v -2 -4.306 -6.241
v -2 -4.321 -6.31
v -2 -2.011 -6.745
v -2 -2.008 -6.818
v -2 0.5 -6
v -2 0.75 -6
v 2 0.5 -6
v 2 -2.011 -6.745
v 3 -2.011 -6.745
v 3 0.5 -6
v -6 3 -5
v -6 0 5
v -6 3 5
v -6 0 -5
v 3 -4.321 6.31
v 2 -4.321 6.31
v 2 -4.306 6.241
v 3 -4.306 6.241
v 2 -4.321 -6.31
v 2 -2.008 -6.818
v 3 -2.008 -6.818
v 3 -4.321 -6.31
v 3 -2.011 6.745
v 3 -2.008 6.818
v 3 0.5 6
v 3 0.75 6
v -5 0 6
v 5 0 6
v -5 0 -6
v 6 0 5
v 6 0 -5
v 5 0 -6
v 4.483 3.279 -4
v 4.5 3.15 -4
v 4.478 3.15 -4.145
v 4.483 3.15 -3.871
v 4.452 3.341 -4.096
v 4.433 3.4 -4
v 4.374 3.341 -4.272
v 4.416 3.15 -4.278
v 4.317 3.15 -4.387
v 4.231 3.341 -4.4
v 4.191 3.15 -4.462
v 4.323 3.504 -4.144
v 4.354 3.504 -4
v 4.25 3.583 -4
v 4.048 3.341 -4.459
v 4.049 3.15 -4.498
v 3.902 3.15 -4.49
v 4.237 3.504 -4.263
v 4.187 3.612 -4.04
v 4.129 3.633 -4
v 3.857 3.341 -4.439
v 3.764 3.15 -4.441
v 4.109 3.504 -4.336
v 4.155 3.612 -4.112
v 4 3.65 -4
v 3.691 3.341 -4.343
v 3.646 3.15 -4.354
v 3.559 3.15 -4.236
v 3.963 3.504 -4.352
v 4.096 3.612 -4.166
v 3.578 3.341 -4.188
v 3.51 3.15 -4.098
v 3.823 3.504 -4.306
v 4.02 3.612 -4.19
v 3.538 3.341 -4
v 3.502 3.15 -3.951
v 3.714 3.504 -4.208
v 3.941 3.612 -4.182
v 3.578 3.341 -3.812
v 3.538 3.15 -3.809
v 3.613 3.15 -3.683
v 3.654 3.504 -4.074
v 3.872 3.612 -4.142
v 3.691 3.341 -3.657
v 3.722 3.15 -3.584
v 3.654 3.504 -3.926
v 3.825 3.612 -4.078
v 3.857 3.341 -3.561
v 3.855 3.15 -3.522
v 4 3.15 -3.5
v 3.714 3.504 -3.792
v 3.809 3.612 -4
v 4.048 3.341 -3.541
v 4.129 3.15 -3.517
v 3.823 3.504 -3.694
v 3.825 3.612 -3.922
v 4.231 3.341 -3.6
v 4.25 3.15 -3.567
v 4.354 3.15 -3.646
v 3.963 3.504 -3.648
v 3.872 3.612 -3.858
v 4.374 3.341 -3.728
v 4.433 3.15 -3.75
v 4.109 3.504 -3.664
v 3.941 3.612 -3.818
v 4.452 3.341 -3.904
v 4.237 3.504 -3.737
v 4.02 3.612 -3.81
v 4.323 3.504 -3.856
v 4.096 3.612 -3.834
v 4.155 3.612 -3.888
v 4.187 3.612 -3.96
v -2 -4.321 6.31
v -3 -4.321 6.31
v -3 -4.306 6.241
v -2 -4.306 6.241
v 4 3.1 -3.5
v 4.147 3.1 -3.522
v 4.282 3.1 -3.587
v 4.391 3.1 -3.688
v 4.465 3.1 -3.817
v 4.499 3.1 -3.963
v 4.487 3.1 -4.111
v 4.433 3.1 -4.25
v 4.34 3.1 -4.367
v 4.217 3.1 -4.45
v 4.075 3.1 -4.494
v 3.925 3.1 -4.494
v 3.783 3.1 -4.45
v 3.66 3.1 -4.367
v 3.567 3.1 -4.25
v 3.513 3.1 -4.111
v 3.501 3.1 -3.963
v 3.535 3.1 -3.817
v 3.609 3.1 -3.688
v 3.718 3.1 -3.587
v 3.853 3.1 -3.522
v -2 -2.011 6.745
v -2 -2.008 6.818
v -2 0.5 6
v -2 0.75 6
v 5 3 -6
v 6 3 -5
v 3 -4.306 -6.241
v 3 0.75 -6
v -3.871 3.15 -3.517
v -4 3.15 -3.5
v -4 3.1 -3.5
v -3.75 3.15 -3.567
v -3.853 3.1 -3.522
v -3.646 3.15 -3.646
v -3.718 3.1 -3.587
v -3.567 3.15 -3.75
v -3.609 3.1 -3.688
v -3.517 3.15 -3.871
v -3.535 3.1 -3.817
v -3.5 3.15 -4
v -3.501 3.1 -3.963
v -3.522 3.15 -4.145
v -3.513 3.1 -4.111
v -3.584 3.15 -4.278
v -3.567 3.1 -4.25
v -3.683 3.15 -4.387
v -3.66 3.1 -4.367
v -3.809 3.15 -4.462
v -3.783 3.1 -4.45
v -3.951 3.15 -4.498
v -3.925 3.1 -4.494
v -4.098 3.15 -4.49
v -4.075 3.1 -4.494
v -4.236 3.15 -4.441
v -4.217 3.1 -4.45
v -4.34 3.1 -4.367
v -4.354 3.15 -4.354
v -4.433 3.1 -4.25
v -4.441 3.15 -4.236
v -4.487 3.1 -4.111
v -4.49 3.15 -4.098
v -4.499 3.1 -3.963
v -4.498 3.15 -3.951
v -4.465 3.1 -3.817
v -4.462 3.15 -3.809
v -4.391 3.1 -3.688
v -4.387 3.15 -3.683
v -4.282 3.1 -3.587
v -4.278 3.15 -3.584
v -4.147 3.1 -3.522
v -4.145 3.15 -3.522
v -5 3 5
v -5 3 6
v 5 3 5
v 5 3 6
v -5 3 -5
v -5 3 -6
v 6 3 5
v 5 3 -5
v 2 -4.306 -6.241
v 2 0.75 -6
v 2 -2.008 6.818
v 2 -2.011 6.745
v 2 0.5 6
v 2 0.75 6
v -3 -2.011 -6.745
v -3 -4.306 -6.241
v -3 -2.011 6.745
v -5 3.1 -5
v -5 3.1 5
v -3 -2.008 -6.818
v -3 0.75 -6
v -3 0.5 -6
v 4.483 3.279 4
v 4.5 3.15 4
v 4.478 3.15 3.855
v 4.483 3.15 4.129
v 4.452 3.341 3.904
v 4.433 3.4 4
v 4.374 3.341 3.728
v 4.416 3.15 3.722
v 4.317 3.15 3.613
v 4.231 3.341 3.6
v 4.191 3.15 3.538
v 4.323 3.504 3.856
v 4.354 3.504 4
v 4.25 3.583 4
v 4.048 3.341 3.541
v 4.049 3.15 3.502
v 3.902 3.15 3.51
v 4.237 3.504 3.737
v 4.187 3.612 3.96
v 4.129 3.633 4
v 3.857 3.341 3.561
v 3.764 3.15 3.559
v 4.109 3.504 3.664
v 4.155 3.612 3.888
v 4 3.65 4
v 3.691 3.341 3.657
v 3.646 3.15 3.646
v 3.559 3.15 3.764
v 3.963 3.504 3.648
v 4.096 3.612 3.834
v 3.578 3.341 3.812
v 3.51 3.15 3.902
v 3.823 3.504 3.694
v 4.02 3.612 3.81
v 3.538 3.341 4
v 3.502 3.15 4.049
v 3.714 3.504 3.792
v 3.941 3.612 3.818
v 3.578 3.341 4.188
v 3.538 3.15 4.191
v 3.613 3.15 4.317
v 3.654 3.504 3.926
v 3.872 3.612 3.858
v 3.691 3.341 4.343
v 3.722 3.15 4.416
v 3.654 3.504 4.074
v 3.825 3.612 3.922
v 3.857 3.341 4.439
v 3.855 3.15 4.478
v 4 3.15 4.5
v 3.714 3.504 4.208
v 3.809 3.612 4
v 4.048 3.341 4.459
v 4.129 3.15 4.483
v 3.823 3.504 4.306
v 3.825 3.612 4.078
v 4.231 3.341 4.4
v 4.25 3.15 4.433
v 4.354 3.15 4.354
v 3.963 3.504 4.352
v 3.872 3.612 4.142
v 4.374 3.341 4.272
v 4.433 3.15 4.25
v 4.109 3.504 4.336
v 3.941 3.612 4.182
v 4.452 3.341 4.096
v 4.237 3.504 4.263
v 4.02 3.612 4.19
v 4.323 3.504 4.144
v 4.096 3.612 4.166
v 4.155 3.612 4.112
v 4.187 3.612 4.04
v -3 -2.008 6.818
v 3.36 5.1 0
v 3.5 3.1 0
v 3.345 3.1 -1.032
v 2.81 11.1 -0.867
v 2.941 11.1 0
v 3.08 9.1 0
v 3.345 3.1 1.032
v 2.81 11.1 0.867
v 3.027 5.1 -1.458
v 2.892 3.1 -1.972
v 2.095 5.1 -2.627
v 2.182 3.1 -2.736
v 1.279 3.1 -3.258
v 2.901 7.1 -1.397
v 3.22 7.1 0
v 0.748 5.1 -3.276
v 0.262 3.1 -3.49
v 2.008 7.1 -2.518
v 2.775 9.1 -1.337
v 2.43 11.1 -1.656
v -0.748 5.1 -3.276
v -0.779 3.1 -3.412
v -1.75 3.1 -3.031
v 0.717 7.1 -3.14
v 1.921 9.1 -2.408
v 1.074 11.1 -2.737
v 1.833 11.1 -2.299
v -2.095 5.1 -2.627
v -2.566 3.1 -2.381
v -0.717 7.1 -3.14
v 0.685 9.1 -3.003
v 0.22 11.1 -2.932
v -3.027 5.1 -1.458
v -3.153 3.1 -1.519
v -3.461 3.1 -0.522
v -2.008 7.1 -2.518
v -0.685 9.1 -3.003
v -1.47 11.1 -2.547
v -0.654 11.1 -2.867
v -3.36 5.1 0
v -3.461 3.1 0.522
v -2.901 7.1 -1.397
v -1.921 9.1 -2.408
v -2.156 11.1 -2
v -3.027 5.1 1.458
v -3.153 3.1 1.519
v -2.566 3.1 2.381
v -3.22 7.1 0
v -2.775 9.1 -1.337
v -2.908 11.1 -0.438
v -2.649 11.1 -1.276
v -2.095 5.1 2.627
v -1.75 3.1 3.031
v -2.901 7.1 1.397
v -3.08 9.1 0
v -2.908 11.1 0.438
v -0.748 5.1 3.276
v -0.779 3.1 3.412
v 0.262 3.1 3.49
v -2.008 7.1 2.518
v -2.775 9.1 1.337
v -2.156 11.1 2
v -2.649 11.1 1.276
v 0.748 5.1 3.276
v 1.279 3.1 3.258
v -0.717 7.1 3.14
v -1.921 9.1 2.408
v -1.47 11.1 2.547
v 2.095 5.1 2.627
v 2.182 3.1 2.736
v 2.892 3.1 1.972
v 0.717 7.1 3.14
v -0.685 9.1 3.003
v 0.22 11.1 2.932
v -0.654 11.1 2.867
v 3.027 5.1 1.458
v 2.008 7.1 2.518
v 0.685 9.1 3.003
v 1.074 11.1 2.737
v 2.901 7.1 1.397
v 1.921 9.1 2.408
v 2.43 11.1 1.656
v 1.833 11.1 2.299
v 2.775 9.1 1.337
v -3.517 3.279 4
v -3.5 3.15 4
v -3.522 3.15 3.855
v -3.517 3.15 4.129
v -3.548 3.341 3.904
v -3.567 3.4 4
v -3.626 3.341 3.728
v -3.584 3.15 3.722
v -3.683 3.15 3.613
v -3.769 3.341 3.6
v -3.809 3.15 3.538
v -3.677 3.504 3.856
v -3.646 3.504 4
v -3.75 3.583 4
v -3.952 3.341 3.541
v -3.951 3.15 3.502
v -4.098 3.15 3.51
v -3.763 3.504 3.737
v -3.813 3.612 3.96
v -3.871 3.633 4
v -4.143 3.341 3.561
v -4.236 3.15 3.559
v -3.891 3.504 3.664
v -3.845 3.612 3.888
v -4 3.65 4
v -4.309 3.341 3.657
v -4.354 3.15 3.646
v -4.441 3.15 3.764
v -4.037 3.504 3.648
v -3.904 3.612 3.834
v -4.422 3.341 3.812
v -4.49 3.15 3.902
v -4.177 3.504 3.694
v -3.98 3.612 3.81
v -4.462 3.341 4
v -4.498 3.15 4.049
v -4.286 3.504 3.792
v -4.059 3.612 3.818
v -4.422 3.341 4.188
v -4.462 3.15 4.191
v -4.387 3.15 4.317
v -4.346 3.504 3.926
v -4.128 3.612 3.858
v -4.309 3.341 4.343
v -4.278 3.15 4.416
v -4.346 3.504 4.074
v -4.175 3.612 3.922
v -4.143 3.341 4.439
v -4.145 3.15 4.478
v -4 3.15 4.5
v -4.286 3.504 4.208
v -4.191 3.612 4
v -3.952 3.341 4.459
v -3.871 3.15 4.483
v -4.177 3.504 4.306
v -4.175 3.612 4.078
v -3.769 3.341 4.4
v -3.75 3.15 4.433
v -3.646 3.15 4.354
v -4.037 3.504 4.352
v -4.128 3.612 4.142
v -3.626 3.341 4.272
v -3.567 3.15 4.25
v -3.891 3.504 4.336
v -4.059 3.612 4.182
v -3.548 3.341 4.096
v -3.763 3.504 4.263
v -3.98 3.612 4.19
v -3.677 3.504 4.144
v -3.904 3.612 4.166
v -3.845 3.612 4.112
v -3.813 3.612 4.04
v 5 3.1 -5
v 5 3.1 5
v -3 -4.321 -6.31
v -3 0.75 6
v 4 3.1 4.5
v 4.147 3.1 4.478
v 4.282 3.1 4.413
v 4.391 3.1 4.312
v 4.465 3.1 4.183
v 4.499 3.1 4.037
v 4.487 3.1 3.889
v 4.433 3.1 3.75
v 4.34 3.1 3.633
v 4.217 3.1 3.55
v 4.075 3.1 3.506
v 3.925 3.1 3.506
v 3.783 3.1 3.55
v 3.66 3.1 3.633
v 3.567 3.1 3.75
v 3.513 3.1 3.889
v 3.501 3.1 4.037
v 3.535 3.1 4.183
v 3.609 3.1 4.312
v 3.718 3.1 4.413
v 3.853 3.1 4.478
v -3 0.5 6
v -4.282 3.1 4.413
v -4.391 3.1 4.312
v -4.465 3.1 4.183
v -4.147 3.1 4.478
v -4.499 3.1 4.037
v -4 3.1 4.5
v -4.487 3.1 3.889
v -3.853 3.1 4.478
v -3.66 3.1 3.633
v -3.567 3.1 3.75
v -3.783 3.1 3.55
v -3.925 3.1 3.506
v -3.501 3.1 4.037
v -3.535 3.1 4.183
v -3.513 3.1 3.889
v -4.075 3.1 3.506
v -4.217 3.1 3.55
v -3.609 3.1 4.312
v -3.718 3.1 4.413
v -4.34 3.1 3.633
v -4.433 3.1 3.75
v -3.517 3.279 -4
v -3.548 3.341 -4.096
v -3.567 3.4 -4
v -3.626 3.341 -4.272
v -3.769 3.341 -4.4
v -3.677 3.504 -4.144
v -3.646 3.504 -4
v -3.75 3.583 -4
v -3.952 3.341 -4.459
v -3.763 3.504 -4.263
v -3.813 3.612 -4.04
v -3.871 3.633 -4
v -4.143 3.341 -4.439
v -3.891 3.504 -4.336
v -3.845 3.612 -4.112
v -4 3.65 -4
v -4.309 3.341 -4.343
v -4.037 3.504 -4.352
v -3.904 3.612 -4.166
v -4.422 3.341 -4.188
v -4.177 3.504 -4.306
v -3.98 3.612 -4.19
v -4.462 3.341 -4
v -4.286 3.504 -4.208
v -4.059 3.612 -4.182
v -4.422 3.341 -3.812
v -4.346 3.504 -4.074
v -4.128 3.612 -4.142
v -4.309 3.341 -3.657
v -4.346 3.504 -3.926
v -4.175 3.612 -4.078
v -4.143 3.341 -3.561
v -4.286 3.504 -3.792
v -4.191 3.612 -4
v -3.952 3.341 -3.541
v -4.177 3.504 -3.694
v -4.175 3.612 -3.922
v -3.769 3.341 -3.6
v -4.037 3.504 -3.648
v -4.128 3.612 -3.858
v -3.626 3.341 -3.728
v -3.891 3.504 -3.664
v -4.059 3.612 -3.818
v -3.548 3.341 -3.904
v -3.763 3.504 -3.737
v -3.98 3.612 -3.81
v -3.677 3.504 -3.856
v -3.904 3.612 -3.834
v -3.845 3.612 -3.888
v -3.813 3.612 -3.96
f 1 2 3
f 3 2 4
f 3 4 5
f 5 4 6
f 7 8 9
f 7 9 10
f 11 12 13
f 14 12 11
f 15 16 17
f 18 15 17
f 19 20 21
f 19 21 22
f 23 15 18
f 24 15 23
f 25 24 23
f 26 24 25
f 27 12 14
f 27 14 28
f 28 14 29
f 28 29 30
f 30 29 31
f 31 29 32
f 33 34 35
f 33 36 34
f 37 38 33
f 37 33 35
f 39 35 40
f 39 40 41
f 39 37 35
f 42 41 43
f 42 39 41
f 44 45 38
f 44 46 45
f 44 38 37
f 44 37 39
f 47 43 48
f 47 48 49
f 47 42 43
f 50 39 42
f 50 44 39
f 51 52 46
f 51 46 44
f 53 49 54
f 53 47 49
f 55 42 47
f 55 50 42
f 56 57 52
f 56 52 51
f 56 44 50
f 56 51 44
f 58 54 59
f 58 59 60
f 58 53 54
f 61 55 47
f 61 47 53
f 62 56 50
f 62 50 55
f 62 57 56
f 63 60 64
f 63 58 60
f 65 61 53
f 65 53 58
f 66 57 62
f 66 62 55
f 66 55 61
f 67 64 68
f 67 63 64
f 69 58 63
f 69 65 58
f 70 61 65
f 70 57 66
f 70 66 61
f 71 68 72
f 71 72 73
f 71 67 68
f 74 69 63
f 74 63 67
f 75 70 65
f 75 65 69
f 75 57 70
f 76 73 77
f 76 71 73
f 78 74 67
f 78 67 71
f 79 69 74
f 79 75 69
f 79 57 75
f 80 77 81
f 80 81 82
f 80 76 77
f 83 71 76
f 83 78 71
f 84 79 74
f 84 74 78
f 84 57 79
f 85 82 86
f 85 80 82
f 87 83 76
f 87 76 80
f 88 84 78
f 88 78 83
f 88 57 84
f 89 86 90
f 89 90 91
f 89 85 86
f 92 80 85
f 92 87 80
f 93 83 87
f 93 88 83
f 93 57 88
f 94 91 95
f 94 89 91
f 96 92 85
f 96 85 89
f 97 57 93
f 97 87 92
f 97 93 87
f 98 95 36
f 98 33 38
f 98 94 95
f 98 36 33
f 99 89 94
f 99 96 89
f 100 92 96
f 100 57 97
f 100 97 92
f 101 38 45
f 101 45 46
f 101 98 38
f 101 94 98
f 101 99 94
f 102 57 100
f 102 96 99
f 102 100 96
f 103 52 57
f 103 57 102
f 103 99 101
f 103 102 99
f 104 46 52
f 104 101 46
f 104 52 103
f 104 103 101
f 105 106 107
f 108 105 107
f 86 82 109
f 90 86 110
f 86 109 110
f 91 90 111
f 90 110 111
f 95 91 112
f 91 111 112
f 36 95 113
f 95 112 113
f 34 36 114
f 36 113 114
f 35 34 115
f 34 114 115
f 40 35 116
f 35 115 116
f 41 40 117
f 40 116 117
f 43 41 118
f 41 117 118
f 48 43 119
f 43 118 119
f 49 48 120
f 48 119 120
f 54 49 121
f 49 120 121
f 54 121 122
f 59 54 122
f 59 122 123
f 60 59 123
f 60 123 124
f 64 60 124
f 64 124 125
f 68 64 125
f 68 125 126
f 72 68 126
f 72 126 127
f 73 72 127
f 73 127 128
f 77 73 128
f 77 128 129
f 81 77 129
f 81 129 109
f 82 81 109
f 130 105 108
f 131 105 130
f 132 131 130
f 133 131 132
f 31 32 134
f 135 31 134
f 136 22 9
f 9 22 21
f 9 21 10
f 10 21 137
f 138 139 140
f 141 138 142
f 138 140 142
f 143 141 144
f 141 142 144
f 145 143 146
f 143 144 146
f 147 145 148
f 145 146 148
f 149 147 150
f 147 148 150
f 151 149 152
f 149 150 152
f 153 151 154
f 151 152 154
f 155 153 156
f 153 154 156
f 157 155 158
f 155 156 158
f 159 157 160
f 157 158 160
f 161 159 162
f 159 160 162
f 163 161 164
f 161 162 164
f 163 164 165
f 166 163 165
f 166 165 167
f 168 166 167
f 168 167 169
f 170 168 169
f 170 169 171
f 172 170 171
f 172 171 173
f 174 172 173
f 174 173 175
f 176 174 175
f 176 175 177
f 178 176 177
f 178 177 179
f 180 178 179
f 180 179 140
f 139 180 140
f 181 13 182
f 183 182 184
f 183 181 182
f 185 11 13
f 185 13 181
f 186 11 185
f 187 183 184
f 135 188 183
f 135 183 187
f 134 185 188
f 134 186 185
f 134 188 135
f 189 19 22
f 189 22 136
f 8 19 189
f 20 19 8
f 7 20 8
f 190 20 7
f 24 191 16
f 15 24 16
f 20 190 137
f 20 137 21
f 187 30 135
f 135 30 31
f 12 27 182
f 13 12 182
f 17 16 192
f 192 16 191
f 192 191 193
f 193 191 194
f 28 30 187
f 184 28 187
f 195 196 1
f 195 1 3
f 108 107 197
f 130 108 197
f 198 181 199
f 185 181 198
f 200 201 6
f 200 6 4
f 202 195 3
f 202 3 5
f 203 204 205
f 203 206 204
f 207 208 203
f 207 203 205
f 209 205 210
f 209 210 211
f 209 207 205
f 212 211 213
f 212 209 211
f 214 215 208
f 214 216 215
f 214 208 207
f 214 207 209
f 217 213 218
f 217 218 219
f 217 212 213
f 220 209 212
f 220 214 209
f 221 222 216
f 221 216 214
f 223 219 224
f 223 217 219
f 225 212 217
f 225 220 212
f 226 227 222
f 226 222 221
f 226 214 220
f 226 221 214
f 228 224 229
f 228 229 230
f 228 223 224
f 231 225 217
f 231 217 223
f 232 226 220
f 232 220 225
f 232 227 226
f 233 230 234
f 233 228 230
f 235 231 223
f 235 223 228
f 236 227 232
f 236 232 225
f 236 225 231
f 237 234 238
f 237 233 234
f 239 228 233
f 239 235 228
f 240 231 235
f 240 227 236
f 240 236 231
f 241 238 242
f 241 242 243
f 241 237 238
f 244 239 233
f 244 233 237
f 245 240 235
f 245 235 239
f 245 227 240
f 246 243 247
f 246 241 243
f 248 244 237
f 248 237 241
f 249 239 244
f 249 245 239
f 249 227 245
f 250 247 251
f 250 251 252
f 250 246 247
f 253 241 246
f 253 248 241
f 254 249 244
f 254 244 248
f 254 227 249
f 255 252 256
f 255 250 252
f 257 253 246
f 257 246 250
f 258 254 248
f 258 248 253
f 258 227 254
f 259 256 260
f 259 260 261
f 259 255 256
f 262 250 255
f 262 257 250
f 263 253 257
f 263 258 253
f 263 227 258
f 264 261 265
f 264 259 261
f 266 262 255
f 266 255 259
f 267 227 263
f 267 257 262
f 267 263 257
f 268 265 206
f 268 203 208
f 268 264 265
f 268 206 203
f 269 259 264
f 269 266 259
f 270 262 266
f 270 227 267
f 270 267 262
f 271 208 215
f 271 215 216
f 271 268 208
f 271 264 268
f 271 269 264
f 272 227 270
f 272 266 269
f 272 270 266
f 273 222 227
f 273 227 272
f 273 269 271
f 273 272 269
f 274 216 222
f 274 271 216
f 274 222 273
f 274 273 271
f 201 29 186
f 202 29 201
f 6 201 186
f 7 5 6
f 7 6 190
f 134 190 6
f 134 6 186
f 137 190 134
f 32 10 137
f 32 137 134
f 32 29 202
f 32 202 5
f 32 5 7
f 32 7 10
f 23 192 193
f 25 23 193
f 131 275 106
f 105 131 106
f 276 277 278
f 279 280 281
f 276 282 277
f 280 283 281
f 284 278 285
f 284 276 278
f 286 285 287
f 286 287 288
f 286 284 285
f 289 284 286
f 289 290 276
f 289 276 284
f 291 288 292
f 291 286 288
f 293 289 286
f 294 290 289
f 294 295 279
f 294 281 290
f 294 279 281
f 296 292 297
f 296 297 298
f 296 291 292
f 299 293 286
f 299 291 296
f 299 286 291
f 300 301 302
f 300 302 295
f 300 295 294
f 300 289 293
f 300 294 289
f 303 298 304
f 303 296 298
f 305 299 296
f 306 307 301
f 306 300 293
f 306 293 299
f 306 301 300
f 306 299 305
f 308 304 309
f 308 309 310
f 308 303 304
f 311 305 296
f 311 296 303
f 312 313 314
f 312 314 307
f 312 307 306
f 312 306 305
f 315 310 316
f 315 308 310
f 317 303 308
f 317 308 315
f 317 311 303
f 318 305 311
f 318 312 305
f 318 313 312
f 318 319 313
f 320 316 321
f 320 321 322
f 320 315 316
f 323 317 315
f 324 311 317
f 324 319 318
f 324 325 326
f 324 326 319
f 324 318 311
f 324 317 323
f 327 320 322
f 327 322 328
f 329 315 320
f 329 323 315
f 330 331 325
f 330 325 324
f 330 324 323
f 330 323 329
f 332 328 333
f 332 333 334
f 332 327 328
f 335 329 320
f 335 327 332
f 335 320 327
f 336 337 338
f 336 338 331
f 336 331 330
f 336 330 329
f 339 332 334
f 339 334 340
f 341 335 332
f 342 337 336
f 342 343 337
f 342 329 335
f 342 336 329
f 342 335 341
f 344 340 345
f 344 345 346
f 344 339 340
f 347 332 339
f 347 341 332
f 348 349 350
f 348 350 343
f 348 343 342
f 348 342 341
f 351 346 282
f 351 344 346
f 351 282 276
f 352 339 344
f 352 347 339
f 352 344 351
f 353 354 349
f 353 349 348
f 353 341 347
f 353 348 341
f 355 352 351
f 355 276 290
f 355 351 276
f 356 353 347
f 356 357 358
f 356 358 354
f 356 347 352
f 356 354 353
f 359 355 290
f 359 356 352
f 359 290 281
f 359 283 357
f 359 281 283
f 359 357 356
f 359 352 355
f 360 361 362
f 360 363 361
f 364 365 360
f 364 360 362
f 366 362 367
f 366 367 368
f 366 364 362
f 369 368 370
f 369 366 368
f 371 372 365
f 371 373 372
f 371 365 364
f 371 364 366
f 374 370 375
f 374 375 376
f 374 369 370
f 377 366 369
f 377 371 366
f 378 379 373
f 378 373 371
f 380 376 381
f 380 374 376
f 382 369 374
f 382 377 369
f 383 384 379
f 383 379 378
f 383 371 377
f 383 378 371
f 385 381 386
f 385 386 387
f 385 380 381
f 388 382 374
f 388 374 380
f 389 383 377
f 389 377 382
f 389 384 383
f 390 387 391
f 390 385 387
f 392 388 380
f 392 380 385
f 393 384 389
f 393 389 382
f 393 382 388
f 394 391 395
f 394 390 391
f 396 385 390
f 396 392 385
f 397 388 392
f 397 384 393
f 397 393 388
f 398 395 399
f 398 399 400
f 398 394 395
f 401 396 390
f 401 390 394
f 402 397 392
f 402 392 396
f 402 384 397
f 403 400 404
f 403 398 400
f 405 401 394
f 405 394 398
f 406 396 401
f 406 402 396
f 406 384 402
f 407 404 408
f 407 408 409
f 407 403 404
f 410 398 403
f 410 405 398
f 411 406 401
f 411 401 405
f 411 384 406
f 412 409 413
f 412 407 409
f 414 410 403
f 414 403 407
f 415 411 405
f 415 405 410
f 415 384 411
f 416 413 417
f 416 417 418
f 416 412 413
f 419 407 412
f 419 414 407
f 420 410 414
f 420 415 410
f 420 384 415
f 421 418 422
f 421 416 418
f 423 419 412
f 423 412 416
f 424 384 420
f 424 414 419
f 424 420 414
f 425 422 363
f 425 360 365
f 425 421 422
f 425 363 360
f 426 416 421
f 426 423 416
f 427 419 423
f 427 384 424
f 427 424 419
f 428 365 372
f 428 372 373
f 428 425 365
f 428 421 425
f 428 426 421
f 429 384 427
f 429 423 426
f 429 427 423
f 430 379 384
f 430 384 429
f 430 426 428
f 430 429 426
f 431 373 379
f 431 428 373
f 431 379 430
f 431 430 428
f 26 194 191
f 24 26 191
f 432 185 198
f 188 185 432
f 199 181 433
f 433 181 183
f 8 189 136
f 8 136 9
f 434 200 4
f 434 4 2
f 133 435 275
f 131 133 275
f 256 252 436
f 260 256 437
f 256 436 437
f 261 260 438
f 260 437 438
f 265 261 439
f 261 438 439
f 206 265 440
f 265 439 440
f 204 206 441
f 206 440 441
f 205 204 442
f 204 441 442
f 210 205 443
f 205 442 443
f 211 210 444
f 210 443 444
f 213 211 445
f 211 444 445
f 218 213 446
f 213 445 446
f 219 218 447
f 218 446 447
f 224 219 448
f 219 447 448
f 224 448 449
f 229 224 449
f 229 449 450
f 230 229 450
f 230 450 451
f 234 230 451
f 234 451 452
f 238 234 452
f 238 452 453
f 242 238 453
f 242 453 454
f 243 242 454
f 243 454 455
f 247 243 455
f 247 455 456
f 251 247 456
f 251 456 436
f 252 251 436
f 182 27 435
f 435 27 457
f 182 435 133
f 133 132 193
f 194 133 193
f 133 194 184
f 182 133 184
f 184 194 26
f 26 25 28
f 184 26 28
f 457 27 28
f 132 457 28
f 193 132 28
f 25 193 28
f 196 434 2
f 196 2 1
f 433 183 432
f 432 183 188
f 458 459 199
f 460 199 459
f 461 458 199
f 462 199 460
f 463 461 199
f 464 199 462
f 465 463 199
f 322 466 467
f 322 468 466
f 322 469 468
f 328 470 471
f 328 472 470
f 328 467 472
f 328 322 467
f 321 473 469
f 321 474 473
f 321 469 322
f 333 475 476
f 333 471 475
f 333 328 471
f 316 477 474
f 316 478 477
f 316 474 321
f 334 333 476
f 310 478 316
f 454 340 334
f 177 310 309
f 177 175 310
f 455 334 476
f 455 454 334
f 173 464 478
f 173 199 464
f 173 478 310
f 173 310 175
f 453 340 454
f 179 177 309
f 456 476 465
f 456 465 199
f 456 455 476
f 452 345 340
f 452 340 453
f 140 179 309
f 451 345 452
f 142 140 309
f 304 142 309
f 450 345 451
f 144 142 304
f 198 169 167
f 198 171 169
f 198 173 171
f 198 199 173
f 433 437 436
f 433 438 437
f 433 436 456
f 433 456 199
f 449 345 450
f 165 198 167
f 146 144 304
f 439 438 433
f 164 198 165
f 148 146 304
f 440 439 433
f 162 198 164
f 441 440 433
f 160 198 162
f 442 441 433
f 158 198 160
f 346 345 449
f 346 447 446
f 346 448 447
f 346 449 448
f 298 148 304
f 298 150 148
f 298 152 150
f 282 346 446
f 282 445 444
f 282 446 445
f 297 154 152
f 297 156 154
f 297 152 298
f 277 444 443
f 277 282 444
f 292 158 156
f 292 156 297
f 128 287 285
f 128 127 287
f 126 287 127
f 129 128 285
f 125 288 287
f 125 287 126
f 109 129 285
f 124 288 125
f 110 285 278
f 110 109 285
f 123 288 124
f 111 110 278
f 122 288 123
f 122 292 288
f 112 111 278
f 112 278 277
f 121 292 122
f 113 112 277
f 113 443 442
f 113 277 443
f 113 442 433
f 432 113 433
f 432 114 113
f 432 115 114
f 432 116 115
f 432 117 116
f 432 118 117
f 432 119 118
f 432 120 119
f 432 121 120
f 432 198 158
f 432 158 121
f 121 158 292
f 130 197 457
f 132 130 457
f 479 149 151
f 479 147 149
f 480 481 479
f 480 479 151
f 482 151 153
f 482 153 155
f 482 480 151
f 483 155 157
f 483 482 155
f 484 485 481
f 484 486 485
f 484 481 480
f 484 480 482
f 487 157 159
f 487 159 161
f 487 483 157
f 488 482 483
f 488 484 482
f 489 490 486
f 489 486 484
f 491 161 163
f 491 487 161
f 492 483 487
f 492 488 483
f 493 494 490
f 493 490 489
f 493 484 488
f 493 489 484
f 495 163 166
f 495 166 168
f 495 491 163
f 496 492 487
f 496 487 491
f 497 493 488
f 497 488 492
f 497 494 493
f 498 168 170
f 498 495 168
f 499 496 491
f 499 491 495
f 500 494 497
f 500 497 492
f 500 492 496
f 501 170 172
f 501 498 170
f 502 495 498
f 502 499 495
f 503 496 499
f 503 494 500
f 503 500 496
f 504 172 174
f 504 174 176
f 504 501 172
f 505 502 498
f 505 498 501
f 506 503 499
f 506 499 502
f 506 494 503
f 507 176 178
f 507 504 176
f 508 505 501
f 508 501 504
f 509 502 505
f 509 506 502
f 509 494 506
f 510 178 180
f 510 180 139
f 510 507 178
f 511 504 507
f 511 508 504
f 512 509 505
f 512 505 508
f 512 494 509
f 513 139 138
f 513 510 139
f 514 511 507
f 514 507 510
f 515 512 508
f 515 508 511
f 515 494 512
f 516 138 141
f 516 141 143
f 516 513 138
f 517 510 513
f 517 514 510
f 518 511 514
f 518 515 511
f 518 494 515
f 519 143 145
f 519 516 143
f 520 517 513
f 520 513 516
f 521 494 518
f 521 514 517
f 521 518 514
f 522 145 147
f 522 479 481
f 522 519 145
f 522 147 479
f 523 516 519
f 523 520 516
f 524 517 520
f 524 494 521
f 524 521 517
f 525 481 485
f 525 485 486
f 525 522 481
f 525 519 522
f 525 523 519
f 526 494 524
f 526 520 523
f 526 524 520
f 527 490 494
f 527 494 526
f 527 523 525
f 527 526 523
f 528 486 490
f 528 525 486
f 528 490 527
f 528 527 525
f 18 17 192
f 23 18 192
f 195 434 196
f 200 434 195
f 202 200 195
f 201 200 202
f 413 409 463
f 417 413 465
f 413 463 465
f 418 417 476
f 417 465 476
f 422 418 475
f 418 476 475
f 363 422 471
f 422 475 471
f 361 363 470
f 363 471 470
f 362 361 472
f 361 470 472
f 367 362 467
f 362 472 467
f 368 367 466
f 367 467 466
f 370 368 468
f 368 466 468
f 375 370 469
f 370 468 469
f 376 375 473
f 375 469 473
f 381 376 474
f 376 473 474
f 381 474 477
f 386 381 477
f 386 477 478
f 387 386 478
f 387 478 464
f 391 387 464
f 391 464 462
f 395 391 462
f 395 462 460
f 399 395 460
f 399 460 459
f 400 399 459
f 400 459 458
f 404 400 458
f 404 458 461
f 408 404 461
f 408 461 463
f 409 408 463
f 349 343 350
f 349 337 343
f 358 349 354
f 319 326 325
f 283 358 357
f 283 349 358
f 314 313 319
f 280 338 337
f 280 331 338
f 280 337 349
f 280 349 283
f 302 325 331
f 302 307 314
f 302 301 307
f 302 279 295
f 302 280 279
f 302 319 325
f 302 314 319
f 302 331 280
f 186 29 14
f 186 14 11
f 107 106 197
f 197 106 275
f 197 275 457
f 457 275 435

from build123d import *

# Parameters (mm, degrees)
SKETCH1_W            = 12
SKETCH1_H            = 12
BOSS_EXTRUDE1_DEPTH  = 3
CHAMFER1_SIZE        = 1
SKETCH2_W            = 10
SKETCH2_H            = 10
BOSS_EXTRUDE2_DEPTH  = 0.1
SKETCH3_R            = 0.5
BOSS_EXTRUDE3_DEPTH  = 0.05
LPATTERN1_COUNT      = 2
LPATTERN1_PITCH      = 8
LPATTERN1_COUNT_DIR2 = 2
LPATTERN1_PITCH_DIR2 = 8
SKETCH4_R            = 3.5
BOSS_EXTRUDE4_DEPTH  = 8
BOSS_EXTRUDE4_TAPER  = 4
SWEEP1_START         = -3
SWEEP1_DEPTH         = 1
SWEEP1_START_2       = 2
SWEEP1_2_DEPTH       = 1


# Read off the part's stored shape, not the designer's step: Dome1, Sweep1
with BuildPart() as part:
    # Sketch1 → Boss-Extrude1 (new body)
    with BuildSketch(Plane(origin=(0, 0, 0), x_dir=(1, 0, 0), z_dir=(0, 1, 0))):
        Rectangle(SKETCH1_W, SKETCH1_H)
    extrude(amount=BOSS_EXTRUDE1_DEPTH)

    # Chamfer1
    chamfer1_edges = [part.edges().sort_by_distance(p)[0] for p in [
        (6, 1.5, 6),
        (-6, 1.5, 6),
        (-6, 1.5, -6),
        (6, 1.5, -6),
    ]]
    chamfer(chamfer1_edges, length=CHAMFER1_SIZE)

    # Sketch2 → Boss-Extrude2 (add)
    with BuildSketch(Plane(origin=(0, 3, 0), x_dir=(1, 0, 0), z_dir=(0, 1, 0))):
        Rectangle(SKETCH2_W, SKETCH2_H)
    extrude(amount=BOSS_EXTRUDE2_DEPTH)

    # Sketch3 → Boss-Extrude3 (add)
    with BuildSketch(Plane(origin=(0, 3.1, 0), x_dir=(1, 0, 0), z_dir=(0, 1, 0))):
        with Locations(Location((-4, 4, 0), (0, 0, 270))):
            Circle(SKETCH3_R)
    boss_extrude3 = extrude(amount=BOSS_EXTRUDE3_DEPTH)

    # Dome1 outline → Dome1 (revolve)
    with BuildSketch(Plane(origin=(-4, 0, -4), x_dir=(1, 0, 0), z_dir=(0, 0, 1))):
        with BuildLine():
            Line((0, 3.15), (0.5, 3.149999999))
            ThreePointArc((0.5, 3.149999999), (0.353553391, 3.50355339), (0, 3.65))
            Line((0, 3.65), (0, 3.15))
        make_face()
    dome1 = revolve(axis=Axis((-4, 0, -4), (0, 1, 0)))

    # LPattern1: Boss-Extrude3, Dome1 2 × 2
    with Locations(*[(i * LPATTERN1_PITCH, 0, j * LPATTERN1_PITCH_DIR2) for i in range(LPATTERN1_COUNT) for j in range(LPATTERN1_COUNT_DIR2) if (i, j) != (0, 0)]):
        add(boss_extrude3)
        add(dome1)

    # Sketch4 → Boss-Extrude4 (add)
    with BuildSketch(Plane(origin=(0, 3.1, 0), x_dir=(1, 0, 0), z_dir=(0, 1, 0))):
        Circle(SKETCH4_R)
    extrude(amount=BOSS_EXTRUDE4_DEPTH, taper=BOSS_EXTRUDE4_TAPER)

    # Sweep1 outline → Sweep1 (add)
    with BuildSketch(Plane.YZ.offset(SWEEP1_START)):
        Polygon((0.75, 6), (-2.007966225, 6.818182656), (-4.321335721, 6.310463619), (-4.306093498, 6.241014001), (-2.010621634, 6.744805015), (0.5, 6), align=None)
    sweep1 = extrude(amount=SWEEP1_DEPTH)

    # Sweep1 2 outline → Sweep1 2 (add)
    with BuildSketch(Plane.YZ.offset(SWEEP1_START_2)):
        Polygon((0.75, 6), (-2.007966225, 6.818182656), (-4.321335721, 6.310463619), (-4.306093498, 6.241014001), (-2.010621634, 6.744805015), (0.5, 6), align=None)
    sweep1_2 = extrude(amount=SWEEP1_2_DEPTH)

    # Mirror1: Sweep1, Sweep1 2 across plane
    add(sweep1.mirror(Plane.XY))
    add(sweep1_2.mirror(Plane.XY))


solid = part.part
